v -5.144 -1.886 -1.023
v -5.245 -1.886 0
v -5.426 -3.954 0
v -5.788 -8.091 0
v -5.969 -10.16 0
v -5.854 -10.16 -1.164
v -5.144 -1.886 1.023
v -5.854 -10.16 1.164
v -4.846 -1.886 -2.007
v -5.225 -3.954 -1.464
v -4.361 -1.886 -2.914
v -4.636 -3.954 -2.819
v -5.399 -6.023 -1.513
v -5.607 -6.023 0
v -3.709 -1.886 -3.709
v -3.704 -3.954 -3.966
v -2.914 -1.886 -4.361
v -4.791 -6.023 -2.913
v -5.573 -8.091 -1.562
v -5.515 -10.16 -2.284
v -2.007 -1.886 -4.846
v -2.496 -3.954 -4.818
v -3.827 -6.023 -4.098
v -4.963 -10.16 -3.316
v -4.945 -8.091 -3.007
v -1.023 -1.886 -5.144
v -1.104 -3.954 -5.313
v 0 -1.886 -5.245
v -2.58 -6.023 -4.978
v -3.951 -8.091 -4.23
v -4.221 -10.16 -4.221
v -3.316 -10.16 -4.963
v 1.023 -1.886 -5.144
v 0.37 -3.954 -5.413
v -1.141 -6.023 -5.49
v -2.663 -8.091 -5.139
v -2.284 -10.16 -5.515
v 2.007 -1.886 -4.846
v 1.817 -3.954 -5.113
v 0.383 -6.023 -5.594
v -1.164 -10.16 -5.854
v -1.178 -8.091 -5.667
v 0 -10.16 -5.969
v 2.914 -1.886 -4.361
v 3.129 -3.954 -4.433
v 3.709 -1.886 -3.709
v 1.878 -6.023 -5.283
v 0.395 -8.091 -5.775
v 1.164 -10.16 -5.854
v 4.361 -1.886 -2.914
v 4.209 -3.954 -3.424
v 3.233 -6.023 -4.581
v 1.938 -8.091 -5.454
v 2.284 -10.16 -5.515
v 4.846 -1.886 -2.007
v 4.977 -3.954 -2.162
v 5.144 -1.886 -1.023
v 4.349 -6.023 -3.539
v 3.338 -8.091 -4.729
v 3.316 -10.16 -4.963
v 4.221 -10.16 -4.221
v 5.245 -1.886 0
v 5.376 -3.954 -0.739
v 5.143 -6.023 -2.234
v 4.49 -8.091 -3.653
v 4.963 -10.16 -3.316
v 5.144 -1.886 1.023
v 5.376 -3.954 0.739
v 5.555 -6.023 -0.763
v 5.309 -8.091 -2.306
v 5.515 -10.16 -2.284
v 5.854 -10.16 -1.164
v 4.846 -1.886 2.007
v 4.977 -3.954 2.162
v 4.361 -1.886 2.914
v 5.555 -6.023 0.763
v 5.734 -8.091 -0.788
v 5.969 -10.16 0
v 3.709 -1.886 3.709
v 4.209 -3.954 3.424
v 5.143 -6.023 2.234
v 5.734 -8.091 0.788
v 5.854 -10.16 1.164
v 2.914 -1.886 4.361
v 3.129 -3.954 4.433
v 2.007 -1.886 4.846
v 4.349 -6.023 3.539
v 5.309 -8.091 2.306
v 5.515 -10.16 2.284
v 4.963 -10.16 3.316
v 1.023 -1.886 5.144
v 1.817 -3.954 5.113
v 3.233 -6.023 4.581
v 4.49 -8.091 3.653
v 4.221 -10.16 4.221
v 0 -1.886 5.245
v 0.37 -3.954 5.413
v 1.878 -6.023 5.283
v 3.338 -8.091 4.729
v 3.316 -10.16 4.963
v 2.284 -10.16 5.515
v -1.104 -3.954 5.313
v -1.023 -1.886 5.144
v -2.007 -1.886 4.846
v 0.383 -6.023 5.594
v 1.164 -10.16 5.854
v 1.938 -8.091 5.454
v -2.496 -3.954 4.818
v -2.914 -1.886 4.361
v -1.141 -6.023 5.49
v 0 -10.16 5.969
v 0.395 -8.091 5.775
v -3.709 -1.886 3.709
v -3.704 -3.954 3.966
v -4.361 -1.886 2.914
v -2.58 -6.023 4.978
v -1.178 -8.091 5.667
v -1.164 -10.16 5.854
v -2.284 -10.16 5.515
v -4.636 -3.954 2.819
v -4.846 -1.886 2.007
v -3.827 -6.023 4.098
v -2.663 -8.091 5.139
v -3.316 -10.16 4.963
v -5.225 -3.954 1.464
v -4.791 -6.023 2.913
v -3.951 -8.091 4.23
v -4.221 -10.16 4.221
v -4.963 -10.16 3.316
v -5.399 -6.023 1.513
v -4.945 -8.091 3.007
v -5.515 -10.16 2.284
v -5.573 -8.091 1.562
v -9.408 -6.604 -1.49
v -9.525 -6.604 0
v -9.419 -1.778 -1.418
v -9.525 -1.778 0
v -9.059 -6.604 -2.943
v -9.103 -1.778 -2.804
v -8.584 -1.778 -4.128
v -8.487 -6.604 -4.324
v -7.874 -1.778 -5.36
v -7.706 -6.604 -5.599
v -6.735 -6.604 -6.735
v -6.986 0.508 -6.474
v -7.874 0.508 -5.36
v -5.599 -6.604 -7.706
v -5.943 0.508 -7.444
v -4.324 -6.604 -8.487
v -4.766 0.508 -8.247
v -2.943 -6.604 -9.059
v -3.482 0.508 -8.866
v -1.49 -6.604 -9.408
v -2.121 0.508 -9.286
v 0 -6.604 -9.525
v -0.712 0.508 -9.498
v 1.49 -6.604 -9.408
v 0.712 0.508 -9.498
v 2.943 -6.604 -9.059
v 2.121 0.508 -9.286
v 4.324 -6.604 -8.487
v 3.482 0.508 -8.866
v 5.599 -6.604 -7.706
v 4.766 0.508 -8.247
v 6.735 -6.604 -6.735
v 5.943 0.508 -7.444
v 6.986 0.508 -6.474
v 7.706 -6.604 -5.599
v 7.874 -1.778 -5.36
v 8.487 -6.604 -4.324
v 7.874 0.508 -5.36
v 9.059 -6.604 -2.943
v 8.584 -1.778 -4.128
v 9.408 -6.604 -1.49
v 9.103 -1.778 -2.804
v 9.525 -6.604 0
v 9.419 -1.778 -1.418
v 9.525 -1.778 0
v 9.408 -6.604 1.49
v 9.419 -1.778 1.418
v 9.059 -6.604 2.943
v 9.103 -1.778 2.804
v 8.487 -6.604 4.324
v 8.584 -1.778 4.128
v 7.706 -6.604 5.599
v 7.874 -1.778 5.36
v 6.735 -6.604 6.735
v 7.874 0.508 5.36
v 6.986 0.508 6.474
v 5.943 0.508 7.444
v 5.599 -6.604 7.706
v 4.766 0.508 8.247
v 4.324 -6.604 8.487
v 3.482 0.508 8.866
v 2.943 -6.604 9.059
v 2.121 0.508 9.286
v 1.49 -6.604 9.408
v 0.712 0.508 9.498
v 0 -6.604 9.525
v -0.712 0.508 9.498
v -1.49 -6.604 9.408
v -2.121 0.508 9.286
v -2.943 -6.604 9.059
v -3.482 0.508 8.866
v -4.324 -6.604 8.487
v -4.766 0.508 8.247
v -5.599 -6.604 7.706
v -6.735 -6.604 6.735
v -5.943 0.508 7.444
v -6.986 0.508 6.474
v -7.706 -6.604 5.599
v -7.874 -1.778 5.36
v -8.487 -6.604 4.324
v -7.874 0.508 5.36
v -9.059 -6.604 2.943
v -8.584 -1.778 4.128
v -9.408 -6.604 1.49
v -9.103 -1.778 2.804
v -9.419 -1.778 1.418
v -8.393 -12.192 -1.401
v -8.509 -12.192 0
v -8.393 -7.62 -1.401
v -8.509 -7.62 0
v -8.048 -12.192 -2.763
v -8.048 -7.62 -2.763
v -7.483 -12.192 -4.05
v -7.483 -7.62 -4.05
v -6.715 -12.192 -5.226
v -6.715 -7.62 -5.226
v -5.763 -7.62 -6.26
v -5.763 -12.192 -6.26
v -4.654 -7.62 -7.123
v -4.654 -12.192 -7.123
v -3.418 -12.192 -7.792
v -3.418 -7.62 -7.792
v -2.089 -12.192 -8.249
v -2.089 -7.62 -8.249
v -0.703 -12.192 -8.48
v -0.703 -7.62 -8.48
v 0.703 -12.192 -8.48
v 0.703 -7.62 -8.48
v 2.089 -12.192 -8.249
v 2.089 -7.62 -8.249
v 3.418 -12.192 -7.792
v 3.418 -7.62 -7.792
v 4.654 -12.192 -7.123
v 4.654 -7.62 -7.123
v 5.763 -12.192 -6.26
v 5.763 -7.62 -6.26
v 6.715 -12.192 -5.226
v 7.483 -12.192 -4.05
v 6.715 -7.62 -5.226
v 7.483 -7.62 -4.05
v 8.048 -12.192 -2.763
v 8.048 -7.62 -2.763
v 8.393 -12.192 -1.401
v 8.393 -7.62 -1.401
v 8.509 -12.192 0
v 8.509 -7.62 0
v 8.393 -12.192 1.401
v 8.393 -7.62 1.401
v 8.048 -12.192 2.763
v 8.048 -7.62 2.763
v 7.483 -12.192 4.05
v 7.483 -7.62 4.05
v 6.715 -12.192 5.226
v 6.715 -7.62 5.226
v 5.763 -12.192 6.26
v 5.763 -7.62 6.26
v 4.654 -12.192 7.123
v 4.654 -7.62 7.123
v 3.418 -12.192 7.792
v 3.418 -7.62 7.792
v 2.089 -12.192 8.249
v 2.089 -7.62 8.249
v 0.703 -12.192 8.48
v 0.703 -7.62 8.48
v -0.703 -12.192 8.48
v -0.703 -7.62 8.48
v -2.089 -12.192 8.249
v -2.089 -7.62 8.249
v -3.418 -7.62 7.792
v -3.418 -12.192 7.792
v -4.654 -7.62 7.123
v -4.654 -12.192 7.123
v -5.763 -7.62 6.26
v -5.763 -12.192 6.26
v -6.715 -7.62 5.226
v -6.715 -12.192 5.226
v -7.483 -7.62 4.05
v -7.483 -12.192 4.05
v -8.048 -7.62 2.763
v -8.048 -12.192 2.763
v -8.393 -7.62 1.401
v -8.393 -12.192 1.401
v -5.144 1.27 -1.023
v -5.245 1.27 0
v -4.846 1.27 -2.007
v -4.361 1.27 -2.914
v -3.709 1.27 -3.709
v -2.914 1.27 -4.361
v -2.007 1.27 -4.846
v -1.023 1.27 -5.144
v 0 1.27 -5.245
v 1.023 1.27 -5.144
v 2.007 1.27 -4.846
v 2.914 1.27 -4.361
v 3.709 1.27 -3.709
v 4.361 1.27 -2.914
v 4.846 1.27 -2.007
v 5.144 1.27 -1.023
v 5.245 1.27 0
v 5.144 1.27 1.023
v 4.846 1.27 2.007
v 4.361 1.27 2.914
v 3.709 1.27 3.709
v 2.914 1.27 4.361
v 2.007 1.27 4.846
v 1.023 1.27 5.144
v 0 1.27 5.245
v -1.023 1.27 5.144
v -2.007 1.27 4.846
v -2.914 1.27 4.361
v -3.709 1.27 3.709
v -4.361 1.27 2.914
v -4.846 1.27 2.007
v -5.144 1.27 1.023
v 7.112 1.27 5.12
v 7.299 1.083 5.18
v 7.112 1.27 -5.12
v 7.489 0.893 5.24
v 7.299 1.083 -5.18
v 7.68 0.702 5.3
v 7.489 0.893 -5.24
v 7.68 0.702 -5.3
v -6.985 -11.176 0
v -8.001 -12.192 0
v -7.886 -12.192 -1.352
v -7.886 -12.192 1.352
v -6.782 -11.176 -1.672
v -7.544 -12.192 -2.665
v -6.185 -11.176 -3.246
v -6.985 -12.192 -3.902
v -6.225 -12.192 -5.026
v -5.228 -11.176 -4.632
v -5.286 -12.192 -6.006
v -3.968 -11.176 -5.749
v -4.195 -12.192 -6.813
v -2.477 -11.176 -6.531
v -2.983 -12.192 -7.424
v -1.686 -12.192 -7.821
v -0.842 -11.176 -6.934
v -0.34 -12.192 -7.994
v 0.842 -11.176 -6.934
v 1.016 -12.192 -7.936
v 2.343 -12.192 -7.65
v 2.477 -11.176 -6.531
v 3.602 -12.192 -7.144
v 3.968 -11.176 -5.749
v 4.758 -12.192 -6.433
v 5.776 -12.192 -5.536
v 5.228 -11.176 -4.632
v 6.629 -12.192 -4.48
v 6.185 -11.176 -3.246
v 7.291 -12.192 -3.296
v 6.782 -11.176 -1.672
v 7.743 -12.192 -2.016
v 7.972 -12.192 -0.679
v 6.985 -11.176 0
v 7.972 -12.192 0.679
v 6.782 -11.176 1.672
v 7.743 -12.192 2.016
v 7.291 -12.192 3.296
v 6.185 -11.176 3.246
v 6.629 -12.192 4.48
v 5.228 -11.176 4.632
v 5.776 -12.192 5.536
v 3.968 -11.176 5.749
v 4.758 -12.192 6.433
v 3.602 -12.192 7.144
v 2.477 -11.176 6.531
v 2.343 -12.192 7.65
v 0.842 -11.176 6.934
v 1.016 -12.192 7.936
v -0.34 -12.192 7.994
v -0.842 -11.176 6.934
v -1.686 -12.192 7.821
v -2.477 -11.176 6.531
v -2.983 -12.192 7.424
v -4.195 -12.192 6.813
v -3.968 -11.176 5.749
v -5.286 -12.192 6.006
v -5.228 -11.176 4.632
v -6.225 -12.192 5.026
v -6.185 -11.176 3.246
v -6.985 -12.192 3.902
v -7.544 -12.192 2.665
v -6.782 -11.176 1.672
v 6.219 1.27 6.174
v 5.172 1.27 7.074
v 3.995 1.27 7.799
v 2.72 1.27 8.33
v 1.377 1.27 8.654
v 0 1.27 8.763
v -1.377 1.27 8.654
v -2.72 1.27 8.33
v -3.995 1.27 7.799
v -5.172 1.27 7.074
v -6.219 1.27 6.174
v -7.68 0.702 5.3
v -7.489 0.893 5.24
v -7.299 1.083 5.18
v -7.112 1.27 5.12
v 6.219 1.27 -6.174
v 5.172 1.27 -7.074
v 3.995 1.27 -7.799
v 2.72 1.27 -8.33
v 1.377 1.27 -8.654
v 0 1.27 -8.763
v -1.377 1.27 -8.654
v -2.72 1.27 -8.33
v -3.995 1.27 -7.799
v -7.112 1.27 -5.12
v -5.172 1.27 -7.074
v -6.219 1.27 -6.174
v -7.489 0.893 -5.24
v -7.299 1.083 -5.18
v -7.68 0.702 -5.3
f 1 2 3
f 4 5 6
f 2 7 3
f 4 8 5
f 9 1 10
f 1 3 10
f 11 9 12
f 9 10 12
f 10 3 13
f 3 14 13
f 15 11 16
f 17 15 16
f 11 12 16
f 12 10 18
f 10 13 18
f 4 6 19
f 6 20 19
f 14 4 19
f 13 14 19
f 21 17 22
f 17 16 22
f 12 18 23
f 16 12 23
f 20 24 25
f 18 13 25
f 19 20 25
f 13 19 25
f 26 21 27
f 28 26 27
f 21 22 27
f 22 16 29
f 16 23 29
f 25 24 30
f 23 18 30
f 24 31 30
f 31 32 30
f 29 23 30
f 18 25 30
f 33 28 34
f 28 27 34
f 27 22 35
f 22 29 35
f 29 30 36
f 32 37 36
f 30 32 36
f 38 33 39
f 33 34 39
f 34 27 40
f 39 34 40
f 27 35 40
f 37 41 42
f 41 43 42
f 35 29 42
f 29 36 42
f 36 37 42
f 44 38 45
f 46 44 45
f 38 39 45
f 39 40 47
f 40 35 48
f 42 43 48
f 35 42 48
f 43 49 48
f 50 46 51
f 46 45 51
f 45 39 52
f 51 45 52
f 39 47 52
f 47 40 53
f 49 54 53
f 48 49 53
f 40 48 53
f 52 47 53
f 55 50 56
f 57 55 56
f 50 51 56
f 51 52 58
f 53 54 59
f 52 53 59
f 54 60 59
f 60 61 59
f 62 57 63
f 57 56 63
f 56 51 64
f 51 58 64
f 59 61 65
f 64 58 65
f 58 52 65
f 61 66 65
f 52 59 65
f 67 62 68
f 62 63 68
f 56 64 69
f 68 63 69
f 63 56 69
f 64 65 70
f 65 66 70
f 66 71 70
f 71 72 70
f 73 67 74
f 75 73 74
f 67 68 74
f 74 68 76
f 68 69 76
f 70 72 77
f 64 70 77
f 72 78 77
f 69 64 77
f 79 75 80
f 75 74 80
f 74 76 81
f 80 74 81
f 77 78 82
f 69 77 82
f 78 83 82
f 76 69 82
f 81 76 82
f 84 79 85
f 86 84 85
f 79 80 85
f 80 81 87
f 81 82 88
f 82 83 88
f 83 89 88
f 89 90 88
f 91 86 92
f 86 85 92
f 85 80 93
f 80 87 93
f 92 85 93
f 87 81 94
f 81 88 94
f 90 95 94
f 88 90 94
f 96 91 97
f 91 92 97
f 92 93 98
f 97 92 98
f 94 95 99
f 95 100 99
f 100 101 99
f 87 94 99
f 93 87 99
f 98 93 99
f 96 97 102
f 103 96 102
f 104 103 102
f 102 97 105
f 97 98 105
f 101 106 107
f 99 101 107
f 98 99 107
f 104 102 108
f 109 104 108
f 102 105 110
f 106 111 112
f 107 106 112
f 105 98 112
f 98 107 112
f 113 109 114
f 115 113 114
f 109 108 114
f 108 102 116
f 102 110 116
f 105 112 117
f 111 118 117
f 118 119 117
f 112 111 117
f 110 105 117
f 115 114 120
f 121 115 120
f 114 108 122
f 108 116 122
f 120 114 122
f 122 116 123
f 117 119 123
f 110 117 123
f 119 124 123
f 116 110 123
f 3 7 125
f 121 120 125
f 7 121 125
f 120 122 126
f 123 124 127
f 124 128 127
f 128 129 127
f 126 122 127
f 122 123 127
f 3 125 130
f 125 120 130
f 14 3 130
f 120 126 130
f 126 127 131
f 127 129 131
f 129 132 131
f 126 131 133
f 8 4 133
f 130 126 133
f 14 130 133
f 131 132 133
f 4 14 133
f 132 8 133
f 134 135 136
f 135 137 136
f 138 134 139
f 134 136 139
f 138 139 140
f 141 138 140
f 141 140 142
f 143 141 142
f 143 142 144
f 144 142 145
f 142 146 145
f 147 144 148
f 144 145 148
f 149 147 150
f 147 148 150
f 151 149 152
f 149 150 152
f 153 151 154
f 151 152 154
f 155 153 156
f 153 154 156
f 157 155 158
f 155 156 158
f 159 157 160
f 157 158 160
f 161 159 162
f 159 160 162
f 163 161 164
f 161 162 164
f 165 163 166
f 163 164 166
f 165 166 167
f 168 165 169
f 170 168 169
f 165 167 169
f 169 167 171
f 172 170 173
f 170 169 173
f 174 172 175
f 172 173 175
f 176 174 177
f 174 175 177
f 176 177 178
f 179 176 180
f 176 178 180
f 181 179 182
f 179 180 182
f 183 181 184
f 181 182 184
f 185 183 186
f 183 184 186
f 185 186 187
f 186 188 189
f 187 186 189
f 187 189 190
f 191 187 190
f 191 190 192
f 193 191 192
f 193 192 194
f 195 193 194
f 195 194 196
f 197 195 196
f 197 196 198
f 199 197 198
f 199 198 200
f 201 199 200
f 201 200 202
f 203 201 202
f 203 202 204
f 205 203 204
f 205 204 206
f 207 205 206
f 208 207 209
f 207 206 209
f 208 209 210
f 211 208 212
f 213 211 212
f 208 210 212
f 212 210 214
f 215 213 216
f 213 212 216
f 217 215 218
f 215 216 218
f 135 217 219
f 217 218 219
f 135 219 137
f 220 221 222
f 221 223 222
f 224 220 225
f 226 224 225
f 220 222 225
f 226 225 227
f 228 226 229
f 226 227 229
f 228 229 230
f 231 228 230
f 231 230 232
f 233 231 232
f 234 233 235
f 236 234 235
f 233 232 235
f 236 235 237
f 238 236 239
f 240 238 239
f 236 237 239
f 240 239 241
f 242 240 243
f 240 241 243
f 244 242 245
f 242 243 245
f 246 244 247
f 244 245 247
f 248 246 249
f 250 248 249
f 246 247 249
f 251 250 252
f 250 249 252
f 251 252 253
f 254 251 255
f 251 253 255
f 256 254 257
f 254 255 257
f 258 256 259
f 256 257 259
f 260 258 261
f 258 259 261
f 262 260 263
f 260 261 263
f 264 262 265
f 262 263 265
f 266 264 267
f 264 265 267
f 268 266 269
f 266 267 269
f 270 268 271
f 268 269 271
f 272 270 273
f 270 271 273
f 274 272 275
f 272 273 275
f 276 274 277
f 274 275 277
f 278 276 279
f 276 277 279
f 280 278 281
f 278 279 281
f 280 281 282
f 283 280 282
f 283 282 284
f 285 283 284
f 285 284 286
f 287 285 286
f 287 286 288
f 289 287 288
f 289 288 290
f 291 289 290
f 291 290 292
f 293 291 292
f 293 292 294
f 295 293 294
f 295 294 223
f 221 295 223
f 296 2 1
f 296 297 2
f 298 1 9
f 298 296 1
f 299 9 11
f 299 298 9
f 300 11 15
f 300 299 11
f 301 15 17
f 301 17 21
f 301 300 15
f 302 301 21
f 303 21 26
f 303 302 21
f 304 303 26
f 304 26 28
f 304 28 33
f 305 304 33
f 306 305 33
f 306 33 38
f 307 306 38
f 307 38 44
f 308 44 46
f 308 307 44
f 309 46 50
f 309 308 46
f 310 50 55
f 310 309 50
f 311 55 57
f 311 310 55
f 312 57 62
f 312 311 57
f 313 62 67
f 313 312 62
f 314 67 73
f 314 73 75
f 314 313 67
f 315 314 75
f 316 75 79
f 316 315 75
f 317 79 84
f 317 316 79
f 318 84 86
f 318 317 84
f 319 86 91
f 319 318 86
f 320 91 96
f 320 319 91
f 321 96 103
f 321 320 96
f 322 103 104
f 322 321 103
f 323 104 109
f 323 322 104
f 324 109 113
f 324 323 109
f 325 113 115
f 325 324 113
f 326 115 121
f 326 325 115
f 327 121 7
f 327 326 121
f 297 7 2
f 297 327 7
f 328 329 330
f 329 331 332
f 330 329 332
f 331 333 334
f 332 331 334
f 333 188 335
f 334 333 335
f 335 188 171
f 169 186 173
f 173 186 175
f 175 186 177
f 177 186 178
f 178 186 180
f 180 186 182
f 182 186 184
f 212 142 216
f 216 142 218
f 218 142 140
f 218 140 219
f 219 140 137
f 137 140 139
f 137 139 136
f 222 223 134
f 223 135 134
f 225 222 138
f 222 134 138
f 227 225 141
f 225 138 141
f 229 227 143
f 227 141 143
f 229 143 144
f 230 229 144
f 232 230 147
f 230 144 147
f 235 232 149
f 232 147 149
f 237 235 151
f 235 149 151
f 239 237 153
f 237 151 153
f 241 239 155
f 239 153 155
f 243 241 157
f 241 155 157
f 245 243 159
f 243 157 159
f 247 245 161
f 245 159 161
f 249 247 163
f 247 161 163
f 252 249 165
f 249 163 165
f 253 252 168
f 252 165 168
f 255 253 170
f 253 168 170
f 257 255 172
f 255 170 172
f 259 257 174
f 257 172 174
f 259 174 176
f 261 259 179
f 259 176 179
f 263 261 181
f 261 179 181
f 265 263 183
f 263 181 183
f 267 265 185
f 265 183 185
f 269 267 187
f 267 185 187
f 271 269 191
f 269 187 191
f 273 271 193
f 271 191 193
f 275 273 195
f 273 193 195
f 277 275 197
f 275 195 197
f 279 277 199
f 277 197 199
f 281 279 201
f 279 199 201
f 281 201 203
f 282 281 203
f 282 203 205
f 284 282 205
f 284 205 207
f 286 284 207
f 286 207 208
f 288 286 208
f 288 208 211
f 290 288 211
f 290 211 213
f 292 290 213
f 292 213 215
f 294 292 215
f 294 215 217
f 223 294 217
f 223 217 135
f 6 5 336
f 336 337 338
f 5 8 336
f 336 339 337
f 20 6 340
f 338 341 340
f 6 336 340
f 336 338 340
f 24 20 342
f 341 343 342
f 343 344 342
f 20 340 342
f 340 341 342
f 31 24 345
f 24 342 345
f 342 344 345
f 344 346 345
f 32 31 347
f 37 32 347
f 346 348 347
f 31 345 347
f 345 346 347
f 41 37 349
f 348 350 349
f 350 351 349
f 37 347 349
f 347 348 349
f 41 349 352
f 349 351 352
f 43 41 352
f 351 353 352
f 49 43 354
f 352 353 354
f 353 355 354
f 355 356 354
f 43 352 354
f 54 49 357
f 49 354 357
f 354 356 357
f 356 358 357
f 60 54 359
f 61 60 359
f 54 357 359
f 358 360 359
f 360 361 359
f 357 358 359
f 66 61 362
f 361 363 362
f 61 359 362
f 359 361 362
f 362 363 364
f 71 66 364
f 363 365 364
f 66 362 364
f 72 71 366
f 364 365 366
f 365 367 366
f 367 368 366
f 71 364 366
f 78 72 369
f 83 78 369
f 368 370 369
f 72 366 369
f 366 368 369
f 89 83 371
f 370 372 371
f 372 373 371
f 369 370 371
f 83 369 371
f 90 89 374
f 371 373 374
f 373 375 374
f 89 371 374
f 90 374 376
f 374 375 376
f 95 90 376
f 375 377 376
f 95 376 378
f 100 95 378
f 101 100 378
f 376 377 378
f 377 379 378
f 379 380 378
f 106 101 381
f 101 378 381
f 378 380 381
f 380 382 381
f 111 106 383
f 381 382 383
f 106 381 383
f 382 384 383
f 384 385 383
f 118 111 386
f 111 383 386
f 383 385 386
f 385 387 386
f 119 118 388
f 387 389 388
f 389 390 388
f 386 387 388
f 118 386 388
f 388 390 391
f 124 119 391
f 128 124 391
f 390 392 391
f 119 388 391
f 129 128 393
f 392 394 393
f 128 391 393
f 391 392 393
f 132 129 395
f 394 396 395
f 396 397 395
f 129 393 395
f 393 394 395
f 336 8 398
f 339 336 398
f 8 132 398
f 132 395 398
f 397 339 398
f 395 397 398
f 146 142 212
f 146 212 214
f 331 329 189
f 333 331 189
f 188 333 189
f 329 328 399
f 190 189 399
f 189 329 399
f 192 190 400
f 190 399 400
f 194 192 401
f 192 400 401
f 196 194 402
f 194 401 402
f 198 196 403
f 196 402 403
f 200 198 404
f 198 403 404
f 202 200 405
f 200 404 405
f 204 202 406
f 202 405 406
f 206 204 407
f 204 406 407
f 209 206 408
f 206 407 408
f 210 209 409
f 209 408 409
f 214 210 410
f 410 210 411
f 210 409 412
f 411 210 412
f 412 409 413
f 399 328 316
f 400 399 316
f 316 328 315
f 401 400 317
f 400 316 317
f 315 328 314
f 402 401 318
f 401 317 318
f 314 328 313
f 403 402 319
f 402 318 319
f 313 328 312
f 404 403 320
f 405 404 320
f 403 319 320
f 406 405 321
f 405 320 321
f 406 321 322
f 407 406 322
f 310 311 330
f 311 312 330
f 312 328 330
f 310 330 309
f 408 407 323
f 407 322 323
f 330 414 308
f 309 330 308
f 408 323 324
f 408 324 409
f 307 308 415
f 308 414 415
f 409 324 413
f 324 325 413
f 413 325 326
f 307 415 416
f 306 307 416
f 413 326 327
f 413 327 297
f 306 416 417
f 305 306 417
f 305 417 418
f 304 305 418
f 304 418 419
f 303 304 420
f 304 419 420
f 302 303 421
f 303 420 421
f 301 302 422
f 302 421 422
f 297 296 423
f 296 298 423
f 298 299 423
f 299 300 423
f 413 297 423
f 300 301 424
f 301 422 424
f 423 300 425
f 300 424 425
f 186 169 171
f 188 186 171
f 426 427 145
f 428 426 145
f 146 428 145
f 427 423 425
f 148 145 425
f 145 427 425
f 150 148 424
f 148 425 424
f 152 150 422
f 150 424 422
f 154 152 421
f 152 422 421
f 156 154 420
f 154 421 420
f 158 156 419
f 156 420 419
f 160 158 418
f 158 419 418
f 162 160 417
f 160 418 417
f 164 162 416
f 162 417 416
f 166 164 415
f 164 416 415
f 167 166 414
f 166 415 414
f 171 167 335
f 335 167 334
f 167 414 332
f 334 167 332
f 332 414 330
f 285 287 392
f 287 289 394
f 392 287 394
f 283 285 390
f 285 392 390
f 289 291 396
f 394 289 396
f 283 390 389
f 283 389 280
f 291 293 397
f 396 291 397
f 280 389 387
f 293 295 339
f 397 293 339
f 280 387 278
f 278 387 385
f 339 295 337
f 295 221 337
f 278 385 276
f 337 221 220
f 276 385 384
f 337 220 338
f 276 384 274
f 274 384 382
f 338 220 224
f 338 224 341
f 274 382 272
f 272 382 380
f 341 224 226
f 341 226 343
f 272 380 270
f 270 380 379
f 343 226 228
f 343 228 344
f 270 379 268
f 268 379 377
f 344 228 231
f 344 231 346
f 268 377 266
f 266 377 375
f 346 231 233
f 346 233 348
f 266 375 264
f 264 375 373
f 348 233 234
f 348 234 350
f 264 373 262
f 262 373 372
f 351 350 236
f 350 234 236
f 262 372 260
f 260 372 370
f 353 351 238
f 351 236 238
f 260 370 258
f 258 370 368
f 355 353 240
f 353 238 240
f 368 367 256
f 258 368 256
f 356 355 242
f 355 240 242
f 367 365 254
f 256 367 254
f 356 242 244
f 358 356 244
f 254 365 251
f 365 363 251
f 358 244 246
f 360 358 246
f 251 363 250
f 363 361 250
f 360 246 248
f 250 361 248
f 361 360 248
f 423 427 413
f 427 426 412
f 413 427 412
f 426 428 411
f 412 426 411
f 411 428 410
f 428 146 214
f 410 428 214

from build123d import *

# Parameters (mm, degrees)
SKETCH2_W               = 1.651
SKETCH2_H               = 3.048
CUT_EXTRUDE1_DEPTH      = 10.525
CUT_EXTRUDE1_DEPTH_BACK = 10.525
CHAMFER1_SIZE           = 0.762


with BuildPart() as part:
    # Sketch1 → Revolve1 (revolve)
    with BuildSketch(Plane.XY):
        Polygon((-5.2451, -1.885785138), (-5.969, -10.16), (-8.001, -12.192), (-8.509, -12.192), (-8.509, -7.62), (-9.525, -6.604), (-9.525, 0.508), (-8.763, 1.27), (-5.2451, 1.27), (-5.2451, 0), align=None)
    revolve(axis=Axis((0, 0, 0), (0, -1, 0)))

    # Sketch2 → Cut-Extrude1 (cut, two sides)
    with BuildSketch(Plane.XY) as cut_extrude1_sk:
        with Locations((-8.6995, -0.254)):
            Rectangle(SKETCH2_W, SKETCH2_H)
        with Locations((8.6995, -0.254)):
            Rectangle(SKETCH2_W, SKETCH2_H)
    extrude(amount=CUT_EXTRUDE1_DEPTH, mode=Mode.SUBTRACT)
    extrude(cut_extrude1_sk.sketch, amount=-CUT_EXTRUDE1_DEPTH_BACK, mode=Mode.SUBTRACT)

    # Chamfer1
    chamfer1_edges = [part.edges().sort_by_distance(p)[0] for p in [
        (7.874, 1.27, 0),
        (-7.874, 1.27, 0),
    ]]
    chamfer(chamfer1_edges, length=CHAMFER1_SIZE)


solid = part.part
